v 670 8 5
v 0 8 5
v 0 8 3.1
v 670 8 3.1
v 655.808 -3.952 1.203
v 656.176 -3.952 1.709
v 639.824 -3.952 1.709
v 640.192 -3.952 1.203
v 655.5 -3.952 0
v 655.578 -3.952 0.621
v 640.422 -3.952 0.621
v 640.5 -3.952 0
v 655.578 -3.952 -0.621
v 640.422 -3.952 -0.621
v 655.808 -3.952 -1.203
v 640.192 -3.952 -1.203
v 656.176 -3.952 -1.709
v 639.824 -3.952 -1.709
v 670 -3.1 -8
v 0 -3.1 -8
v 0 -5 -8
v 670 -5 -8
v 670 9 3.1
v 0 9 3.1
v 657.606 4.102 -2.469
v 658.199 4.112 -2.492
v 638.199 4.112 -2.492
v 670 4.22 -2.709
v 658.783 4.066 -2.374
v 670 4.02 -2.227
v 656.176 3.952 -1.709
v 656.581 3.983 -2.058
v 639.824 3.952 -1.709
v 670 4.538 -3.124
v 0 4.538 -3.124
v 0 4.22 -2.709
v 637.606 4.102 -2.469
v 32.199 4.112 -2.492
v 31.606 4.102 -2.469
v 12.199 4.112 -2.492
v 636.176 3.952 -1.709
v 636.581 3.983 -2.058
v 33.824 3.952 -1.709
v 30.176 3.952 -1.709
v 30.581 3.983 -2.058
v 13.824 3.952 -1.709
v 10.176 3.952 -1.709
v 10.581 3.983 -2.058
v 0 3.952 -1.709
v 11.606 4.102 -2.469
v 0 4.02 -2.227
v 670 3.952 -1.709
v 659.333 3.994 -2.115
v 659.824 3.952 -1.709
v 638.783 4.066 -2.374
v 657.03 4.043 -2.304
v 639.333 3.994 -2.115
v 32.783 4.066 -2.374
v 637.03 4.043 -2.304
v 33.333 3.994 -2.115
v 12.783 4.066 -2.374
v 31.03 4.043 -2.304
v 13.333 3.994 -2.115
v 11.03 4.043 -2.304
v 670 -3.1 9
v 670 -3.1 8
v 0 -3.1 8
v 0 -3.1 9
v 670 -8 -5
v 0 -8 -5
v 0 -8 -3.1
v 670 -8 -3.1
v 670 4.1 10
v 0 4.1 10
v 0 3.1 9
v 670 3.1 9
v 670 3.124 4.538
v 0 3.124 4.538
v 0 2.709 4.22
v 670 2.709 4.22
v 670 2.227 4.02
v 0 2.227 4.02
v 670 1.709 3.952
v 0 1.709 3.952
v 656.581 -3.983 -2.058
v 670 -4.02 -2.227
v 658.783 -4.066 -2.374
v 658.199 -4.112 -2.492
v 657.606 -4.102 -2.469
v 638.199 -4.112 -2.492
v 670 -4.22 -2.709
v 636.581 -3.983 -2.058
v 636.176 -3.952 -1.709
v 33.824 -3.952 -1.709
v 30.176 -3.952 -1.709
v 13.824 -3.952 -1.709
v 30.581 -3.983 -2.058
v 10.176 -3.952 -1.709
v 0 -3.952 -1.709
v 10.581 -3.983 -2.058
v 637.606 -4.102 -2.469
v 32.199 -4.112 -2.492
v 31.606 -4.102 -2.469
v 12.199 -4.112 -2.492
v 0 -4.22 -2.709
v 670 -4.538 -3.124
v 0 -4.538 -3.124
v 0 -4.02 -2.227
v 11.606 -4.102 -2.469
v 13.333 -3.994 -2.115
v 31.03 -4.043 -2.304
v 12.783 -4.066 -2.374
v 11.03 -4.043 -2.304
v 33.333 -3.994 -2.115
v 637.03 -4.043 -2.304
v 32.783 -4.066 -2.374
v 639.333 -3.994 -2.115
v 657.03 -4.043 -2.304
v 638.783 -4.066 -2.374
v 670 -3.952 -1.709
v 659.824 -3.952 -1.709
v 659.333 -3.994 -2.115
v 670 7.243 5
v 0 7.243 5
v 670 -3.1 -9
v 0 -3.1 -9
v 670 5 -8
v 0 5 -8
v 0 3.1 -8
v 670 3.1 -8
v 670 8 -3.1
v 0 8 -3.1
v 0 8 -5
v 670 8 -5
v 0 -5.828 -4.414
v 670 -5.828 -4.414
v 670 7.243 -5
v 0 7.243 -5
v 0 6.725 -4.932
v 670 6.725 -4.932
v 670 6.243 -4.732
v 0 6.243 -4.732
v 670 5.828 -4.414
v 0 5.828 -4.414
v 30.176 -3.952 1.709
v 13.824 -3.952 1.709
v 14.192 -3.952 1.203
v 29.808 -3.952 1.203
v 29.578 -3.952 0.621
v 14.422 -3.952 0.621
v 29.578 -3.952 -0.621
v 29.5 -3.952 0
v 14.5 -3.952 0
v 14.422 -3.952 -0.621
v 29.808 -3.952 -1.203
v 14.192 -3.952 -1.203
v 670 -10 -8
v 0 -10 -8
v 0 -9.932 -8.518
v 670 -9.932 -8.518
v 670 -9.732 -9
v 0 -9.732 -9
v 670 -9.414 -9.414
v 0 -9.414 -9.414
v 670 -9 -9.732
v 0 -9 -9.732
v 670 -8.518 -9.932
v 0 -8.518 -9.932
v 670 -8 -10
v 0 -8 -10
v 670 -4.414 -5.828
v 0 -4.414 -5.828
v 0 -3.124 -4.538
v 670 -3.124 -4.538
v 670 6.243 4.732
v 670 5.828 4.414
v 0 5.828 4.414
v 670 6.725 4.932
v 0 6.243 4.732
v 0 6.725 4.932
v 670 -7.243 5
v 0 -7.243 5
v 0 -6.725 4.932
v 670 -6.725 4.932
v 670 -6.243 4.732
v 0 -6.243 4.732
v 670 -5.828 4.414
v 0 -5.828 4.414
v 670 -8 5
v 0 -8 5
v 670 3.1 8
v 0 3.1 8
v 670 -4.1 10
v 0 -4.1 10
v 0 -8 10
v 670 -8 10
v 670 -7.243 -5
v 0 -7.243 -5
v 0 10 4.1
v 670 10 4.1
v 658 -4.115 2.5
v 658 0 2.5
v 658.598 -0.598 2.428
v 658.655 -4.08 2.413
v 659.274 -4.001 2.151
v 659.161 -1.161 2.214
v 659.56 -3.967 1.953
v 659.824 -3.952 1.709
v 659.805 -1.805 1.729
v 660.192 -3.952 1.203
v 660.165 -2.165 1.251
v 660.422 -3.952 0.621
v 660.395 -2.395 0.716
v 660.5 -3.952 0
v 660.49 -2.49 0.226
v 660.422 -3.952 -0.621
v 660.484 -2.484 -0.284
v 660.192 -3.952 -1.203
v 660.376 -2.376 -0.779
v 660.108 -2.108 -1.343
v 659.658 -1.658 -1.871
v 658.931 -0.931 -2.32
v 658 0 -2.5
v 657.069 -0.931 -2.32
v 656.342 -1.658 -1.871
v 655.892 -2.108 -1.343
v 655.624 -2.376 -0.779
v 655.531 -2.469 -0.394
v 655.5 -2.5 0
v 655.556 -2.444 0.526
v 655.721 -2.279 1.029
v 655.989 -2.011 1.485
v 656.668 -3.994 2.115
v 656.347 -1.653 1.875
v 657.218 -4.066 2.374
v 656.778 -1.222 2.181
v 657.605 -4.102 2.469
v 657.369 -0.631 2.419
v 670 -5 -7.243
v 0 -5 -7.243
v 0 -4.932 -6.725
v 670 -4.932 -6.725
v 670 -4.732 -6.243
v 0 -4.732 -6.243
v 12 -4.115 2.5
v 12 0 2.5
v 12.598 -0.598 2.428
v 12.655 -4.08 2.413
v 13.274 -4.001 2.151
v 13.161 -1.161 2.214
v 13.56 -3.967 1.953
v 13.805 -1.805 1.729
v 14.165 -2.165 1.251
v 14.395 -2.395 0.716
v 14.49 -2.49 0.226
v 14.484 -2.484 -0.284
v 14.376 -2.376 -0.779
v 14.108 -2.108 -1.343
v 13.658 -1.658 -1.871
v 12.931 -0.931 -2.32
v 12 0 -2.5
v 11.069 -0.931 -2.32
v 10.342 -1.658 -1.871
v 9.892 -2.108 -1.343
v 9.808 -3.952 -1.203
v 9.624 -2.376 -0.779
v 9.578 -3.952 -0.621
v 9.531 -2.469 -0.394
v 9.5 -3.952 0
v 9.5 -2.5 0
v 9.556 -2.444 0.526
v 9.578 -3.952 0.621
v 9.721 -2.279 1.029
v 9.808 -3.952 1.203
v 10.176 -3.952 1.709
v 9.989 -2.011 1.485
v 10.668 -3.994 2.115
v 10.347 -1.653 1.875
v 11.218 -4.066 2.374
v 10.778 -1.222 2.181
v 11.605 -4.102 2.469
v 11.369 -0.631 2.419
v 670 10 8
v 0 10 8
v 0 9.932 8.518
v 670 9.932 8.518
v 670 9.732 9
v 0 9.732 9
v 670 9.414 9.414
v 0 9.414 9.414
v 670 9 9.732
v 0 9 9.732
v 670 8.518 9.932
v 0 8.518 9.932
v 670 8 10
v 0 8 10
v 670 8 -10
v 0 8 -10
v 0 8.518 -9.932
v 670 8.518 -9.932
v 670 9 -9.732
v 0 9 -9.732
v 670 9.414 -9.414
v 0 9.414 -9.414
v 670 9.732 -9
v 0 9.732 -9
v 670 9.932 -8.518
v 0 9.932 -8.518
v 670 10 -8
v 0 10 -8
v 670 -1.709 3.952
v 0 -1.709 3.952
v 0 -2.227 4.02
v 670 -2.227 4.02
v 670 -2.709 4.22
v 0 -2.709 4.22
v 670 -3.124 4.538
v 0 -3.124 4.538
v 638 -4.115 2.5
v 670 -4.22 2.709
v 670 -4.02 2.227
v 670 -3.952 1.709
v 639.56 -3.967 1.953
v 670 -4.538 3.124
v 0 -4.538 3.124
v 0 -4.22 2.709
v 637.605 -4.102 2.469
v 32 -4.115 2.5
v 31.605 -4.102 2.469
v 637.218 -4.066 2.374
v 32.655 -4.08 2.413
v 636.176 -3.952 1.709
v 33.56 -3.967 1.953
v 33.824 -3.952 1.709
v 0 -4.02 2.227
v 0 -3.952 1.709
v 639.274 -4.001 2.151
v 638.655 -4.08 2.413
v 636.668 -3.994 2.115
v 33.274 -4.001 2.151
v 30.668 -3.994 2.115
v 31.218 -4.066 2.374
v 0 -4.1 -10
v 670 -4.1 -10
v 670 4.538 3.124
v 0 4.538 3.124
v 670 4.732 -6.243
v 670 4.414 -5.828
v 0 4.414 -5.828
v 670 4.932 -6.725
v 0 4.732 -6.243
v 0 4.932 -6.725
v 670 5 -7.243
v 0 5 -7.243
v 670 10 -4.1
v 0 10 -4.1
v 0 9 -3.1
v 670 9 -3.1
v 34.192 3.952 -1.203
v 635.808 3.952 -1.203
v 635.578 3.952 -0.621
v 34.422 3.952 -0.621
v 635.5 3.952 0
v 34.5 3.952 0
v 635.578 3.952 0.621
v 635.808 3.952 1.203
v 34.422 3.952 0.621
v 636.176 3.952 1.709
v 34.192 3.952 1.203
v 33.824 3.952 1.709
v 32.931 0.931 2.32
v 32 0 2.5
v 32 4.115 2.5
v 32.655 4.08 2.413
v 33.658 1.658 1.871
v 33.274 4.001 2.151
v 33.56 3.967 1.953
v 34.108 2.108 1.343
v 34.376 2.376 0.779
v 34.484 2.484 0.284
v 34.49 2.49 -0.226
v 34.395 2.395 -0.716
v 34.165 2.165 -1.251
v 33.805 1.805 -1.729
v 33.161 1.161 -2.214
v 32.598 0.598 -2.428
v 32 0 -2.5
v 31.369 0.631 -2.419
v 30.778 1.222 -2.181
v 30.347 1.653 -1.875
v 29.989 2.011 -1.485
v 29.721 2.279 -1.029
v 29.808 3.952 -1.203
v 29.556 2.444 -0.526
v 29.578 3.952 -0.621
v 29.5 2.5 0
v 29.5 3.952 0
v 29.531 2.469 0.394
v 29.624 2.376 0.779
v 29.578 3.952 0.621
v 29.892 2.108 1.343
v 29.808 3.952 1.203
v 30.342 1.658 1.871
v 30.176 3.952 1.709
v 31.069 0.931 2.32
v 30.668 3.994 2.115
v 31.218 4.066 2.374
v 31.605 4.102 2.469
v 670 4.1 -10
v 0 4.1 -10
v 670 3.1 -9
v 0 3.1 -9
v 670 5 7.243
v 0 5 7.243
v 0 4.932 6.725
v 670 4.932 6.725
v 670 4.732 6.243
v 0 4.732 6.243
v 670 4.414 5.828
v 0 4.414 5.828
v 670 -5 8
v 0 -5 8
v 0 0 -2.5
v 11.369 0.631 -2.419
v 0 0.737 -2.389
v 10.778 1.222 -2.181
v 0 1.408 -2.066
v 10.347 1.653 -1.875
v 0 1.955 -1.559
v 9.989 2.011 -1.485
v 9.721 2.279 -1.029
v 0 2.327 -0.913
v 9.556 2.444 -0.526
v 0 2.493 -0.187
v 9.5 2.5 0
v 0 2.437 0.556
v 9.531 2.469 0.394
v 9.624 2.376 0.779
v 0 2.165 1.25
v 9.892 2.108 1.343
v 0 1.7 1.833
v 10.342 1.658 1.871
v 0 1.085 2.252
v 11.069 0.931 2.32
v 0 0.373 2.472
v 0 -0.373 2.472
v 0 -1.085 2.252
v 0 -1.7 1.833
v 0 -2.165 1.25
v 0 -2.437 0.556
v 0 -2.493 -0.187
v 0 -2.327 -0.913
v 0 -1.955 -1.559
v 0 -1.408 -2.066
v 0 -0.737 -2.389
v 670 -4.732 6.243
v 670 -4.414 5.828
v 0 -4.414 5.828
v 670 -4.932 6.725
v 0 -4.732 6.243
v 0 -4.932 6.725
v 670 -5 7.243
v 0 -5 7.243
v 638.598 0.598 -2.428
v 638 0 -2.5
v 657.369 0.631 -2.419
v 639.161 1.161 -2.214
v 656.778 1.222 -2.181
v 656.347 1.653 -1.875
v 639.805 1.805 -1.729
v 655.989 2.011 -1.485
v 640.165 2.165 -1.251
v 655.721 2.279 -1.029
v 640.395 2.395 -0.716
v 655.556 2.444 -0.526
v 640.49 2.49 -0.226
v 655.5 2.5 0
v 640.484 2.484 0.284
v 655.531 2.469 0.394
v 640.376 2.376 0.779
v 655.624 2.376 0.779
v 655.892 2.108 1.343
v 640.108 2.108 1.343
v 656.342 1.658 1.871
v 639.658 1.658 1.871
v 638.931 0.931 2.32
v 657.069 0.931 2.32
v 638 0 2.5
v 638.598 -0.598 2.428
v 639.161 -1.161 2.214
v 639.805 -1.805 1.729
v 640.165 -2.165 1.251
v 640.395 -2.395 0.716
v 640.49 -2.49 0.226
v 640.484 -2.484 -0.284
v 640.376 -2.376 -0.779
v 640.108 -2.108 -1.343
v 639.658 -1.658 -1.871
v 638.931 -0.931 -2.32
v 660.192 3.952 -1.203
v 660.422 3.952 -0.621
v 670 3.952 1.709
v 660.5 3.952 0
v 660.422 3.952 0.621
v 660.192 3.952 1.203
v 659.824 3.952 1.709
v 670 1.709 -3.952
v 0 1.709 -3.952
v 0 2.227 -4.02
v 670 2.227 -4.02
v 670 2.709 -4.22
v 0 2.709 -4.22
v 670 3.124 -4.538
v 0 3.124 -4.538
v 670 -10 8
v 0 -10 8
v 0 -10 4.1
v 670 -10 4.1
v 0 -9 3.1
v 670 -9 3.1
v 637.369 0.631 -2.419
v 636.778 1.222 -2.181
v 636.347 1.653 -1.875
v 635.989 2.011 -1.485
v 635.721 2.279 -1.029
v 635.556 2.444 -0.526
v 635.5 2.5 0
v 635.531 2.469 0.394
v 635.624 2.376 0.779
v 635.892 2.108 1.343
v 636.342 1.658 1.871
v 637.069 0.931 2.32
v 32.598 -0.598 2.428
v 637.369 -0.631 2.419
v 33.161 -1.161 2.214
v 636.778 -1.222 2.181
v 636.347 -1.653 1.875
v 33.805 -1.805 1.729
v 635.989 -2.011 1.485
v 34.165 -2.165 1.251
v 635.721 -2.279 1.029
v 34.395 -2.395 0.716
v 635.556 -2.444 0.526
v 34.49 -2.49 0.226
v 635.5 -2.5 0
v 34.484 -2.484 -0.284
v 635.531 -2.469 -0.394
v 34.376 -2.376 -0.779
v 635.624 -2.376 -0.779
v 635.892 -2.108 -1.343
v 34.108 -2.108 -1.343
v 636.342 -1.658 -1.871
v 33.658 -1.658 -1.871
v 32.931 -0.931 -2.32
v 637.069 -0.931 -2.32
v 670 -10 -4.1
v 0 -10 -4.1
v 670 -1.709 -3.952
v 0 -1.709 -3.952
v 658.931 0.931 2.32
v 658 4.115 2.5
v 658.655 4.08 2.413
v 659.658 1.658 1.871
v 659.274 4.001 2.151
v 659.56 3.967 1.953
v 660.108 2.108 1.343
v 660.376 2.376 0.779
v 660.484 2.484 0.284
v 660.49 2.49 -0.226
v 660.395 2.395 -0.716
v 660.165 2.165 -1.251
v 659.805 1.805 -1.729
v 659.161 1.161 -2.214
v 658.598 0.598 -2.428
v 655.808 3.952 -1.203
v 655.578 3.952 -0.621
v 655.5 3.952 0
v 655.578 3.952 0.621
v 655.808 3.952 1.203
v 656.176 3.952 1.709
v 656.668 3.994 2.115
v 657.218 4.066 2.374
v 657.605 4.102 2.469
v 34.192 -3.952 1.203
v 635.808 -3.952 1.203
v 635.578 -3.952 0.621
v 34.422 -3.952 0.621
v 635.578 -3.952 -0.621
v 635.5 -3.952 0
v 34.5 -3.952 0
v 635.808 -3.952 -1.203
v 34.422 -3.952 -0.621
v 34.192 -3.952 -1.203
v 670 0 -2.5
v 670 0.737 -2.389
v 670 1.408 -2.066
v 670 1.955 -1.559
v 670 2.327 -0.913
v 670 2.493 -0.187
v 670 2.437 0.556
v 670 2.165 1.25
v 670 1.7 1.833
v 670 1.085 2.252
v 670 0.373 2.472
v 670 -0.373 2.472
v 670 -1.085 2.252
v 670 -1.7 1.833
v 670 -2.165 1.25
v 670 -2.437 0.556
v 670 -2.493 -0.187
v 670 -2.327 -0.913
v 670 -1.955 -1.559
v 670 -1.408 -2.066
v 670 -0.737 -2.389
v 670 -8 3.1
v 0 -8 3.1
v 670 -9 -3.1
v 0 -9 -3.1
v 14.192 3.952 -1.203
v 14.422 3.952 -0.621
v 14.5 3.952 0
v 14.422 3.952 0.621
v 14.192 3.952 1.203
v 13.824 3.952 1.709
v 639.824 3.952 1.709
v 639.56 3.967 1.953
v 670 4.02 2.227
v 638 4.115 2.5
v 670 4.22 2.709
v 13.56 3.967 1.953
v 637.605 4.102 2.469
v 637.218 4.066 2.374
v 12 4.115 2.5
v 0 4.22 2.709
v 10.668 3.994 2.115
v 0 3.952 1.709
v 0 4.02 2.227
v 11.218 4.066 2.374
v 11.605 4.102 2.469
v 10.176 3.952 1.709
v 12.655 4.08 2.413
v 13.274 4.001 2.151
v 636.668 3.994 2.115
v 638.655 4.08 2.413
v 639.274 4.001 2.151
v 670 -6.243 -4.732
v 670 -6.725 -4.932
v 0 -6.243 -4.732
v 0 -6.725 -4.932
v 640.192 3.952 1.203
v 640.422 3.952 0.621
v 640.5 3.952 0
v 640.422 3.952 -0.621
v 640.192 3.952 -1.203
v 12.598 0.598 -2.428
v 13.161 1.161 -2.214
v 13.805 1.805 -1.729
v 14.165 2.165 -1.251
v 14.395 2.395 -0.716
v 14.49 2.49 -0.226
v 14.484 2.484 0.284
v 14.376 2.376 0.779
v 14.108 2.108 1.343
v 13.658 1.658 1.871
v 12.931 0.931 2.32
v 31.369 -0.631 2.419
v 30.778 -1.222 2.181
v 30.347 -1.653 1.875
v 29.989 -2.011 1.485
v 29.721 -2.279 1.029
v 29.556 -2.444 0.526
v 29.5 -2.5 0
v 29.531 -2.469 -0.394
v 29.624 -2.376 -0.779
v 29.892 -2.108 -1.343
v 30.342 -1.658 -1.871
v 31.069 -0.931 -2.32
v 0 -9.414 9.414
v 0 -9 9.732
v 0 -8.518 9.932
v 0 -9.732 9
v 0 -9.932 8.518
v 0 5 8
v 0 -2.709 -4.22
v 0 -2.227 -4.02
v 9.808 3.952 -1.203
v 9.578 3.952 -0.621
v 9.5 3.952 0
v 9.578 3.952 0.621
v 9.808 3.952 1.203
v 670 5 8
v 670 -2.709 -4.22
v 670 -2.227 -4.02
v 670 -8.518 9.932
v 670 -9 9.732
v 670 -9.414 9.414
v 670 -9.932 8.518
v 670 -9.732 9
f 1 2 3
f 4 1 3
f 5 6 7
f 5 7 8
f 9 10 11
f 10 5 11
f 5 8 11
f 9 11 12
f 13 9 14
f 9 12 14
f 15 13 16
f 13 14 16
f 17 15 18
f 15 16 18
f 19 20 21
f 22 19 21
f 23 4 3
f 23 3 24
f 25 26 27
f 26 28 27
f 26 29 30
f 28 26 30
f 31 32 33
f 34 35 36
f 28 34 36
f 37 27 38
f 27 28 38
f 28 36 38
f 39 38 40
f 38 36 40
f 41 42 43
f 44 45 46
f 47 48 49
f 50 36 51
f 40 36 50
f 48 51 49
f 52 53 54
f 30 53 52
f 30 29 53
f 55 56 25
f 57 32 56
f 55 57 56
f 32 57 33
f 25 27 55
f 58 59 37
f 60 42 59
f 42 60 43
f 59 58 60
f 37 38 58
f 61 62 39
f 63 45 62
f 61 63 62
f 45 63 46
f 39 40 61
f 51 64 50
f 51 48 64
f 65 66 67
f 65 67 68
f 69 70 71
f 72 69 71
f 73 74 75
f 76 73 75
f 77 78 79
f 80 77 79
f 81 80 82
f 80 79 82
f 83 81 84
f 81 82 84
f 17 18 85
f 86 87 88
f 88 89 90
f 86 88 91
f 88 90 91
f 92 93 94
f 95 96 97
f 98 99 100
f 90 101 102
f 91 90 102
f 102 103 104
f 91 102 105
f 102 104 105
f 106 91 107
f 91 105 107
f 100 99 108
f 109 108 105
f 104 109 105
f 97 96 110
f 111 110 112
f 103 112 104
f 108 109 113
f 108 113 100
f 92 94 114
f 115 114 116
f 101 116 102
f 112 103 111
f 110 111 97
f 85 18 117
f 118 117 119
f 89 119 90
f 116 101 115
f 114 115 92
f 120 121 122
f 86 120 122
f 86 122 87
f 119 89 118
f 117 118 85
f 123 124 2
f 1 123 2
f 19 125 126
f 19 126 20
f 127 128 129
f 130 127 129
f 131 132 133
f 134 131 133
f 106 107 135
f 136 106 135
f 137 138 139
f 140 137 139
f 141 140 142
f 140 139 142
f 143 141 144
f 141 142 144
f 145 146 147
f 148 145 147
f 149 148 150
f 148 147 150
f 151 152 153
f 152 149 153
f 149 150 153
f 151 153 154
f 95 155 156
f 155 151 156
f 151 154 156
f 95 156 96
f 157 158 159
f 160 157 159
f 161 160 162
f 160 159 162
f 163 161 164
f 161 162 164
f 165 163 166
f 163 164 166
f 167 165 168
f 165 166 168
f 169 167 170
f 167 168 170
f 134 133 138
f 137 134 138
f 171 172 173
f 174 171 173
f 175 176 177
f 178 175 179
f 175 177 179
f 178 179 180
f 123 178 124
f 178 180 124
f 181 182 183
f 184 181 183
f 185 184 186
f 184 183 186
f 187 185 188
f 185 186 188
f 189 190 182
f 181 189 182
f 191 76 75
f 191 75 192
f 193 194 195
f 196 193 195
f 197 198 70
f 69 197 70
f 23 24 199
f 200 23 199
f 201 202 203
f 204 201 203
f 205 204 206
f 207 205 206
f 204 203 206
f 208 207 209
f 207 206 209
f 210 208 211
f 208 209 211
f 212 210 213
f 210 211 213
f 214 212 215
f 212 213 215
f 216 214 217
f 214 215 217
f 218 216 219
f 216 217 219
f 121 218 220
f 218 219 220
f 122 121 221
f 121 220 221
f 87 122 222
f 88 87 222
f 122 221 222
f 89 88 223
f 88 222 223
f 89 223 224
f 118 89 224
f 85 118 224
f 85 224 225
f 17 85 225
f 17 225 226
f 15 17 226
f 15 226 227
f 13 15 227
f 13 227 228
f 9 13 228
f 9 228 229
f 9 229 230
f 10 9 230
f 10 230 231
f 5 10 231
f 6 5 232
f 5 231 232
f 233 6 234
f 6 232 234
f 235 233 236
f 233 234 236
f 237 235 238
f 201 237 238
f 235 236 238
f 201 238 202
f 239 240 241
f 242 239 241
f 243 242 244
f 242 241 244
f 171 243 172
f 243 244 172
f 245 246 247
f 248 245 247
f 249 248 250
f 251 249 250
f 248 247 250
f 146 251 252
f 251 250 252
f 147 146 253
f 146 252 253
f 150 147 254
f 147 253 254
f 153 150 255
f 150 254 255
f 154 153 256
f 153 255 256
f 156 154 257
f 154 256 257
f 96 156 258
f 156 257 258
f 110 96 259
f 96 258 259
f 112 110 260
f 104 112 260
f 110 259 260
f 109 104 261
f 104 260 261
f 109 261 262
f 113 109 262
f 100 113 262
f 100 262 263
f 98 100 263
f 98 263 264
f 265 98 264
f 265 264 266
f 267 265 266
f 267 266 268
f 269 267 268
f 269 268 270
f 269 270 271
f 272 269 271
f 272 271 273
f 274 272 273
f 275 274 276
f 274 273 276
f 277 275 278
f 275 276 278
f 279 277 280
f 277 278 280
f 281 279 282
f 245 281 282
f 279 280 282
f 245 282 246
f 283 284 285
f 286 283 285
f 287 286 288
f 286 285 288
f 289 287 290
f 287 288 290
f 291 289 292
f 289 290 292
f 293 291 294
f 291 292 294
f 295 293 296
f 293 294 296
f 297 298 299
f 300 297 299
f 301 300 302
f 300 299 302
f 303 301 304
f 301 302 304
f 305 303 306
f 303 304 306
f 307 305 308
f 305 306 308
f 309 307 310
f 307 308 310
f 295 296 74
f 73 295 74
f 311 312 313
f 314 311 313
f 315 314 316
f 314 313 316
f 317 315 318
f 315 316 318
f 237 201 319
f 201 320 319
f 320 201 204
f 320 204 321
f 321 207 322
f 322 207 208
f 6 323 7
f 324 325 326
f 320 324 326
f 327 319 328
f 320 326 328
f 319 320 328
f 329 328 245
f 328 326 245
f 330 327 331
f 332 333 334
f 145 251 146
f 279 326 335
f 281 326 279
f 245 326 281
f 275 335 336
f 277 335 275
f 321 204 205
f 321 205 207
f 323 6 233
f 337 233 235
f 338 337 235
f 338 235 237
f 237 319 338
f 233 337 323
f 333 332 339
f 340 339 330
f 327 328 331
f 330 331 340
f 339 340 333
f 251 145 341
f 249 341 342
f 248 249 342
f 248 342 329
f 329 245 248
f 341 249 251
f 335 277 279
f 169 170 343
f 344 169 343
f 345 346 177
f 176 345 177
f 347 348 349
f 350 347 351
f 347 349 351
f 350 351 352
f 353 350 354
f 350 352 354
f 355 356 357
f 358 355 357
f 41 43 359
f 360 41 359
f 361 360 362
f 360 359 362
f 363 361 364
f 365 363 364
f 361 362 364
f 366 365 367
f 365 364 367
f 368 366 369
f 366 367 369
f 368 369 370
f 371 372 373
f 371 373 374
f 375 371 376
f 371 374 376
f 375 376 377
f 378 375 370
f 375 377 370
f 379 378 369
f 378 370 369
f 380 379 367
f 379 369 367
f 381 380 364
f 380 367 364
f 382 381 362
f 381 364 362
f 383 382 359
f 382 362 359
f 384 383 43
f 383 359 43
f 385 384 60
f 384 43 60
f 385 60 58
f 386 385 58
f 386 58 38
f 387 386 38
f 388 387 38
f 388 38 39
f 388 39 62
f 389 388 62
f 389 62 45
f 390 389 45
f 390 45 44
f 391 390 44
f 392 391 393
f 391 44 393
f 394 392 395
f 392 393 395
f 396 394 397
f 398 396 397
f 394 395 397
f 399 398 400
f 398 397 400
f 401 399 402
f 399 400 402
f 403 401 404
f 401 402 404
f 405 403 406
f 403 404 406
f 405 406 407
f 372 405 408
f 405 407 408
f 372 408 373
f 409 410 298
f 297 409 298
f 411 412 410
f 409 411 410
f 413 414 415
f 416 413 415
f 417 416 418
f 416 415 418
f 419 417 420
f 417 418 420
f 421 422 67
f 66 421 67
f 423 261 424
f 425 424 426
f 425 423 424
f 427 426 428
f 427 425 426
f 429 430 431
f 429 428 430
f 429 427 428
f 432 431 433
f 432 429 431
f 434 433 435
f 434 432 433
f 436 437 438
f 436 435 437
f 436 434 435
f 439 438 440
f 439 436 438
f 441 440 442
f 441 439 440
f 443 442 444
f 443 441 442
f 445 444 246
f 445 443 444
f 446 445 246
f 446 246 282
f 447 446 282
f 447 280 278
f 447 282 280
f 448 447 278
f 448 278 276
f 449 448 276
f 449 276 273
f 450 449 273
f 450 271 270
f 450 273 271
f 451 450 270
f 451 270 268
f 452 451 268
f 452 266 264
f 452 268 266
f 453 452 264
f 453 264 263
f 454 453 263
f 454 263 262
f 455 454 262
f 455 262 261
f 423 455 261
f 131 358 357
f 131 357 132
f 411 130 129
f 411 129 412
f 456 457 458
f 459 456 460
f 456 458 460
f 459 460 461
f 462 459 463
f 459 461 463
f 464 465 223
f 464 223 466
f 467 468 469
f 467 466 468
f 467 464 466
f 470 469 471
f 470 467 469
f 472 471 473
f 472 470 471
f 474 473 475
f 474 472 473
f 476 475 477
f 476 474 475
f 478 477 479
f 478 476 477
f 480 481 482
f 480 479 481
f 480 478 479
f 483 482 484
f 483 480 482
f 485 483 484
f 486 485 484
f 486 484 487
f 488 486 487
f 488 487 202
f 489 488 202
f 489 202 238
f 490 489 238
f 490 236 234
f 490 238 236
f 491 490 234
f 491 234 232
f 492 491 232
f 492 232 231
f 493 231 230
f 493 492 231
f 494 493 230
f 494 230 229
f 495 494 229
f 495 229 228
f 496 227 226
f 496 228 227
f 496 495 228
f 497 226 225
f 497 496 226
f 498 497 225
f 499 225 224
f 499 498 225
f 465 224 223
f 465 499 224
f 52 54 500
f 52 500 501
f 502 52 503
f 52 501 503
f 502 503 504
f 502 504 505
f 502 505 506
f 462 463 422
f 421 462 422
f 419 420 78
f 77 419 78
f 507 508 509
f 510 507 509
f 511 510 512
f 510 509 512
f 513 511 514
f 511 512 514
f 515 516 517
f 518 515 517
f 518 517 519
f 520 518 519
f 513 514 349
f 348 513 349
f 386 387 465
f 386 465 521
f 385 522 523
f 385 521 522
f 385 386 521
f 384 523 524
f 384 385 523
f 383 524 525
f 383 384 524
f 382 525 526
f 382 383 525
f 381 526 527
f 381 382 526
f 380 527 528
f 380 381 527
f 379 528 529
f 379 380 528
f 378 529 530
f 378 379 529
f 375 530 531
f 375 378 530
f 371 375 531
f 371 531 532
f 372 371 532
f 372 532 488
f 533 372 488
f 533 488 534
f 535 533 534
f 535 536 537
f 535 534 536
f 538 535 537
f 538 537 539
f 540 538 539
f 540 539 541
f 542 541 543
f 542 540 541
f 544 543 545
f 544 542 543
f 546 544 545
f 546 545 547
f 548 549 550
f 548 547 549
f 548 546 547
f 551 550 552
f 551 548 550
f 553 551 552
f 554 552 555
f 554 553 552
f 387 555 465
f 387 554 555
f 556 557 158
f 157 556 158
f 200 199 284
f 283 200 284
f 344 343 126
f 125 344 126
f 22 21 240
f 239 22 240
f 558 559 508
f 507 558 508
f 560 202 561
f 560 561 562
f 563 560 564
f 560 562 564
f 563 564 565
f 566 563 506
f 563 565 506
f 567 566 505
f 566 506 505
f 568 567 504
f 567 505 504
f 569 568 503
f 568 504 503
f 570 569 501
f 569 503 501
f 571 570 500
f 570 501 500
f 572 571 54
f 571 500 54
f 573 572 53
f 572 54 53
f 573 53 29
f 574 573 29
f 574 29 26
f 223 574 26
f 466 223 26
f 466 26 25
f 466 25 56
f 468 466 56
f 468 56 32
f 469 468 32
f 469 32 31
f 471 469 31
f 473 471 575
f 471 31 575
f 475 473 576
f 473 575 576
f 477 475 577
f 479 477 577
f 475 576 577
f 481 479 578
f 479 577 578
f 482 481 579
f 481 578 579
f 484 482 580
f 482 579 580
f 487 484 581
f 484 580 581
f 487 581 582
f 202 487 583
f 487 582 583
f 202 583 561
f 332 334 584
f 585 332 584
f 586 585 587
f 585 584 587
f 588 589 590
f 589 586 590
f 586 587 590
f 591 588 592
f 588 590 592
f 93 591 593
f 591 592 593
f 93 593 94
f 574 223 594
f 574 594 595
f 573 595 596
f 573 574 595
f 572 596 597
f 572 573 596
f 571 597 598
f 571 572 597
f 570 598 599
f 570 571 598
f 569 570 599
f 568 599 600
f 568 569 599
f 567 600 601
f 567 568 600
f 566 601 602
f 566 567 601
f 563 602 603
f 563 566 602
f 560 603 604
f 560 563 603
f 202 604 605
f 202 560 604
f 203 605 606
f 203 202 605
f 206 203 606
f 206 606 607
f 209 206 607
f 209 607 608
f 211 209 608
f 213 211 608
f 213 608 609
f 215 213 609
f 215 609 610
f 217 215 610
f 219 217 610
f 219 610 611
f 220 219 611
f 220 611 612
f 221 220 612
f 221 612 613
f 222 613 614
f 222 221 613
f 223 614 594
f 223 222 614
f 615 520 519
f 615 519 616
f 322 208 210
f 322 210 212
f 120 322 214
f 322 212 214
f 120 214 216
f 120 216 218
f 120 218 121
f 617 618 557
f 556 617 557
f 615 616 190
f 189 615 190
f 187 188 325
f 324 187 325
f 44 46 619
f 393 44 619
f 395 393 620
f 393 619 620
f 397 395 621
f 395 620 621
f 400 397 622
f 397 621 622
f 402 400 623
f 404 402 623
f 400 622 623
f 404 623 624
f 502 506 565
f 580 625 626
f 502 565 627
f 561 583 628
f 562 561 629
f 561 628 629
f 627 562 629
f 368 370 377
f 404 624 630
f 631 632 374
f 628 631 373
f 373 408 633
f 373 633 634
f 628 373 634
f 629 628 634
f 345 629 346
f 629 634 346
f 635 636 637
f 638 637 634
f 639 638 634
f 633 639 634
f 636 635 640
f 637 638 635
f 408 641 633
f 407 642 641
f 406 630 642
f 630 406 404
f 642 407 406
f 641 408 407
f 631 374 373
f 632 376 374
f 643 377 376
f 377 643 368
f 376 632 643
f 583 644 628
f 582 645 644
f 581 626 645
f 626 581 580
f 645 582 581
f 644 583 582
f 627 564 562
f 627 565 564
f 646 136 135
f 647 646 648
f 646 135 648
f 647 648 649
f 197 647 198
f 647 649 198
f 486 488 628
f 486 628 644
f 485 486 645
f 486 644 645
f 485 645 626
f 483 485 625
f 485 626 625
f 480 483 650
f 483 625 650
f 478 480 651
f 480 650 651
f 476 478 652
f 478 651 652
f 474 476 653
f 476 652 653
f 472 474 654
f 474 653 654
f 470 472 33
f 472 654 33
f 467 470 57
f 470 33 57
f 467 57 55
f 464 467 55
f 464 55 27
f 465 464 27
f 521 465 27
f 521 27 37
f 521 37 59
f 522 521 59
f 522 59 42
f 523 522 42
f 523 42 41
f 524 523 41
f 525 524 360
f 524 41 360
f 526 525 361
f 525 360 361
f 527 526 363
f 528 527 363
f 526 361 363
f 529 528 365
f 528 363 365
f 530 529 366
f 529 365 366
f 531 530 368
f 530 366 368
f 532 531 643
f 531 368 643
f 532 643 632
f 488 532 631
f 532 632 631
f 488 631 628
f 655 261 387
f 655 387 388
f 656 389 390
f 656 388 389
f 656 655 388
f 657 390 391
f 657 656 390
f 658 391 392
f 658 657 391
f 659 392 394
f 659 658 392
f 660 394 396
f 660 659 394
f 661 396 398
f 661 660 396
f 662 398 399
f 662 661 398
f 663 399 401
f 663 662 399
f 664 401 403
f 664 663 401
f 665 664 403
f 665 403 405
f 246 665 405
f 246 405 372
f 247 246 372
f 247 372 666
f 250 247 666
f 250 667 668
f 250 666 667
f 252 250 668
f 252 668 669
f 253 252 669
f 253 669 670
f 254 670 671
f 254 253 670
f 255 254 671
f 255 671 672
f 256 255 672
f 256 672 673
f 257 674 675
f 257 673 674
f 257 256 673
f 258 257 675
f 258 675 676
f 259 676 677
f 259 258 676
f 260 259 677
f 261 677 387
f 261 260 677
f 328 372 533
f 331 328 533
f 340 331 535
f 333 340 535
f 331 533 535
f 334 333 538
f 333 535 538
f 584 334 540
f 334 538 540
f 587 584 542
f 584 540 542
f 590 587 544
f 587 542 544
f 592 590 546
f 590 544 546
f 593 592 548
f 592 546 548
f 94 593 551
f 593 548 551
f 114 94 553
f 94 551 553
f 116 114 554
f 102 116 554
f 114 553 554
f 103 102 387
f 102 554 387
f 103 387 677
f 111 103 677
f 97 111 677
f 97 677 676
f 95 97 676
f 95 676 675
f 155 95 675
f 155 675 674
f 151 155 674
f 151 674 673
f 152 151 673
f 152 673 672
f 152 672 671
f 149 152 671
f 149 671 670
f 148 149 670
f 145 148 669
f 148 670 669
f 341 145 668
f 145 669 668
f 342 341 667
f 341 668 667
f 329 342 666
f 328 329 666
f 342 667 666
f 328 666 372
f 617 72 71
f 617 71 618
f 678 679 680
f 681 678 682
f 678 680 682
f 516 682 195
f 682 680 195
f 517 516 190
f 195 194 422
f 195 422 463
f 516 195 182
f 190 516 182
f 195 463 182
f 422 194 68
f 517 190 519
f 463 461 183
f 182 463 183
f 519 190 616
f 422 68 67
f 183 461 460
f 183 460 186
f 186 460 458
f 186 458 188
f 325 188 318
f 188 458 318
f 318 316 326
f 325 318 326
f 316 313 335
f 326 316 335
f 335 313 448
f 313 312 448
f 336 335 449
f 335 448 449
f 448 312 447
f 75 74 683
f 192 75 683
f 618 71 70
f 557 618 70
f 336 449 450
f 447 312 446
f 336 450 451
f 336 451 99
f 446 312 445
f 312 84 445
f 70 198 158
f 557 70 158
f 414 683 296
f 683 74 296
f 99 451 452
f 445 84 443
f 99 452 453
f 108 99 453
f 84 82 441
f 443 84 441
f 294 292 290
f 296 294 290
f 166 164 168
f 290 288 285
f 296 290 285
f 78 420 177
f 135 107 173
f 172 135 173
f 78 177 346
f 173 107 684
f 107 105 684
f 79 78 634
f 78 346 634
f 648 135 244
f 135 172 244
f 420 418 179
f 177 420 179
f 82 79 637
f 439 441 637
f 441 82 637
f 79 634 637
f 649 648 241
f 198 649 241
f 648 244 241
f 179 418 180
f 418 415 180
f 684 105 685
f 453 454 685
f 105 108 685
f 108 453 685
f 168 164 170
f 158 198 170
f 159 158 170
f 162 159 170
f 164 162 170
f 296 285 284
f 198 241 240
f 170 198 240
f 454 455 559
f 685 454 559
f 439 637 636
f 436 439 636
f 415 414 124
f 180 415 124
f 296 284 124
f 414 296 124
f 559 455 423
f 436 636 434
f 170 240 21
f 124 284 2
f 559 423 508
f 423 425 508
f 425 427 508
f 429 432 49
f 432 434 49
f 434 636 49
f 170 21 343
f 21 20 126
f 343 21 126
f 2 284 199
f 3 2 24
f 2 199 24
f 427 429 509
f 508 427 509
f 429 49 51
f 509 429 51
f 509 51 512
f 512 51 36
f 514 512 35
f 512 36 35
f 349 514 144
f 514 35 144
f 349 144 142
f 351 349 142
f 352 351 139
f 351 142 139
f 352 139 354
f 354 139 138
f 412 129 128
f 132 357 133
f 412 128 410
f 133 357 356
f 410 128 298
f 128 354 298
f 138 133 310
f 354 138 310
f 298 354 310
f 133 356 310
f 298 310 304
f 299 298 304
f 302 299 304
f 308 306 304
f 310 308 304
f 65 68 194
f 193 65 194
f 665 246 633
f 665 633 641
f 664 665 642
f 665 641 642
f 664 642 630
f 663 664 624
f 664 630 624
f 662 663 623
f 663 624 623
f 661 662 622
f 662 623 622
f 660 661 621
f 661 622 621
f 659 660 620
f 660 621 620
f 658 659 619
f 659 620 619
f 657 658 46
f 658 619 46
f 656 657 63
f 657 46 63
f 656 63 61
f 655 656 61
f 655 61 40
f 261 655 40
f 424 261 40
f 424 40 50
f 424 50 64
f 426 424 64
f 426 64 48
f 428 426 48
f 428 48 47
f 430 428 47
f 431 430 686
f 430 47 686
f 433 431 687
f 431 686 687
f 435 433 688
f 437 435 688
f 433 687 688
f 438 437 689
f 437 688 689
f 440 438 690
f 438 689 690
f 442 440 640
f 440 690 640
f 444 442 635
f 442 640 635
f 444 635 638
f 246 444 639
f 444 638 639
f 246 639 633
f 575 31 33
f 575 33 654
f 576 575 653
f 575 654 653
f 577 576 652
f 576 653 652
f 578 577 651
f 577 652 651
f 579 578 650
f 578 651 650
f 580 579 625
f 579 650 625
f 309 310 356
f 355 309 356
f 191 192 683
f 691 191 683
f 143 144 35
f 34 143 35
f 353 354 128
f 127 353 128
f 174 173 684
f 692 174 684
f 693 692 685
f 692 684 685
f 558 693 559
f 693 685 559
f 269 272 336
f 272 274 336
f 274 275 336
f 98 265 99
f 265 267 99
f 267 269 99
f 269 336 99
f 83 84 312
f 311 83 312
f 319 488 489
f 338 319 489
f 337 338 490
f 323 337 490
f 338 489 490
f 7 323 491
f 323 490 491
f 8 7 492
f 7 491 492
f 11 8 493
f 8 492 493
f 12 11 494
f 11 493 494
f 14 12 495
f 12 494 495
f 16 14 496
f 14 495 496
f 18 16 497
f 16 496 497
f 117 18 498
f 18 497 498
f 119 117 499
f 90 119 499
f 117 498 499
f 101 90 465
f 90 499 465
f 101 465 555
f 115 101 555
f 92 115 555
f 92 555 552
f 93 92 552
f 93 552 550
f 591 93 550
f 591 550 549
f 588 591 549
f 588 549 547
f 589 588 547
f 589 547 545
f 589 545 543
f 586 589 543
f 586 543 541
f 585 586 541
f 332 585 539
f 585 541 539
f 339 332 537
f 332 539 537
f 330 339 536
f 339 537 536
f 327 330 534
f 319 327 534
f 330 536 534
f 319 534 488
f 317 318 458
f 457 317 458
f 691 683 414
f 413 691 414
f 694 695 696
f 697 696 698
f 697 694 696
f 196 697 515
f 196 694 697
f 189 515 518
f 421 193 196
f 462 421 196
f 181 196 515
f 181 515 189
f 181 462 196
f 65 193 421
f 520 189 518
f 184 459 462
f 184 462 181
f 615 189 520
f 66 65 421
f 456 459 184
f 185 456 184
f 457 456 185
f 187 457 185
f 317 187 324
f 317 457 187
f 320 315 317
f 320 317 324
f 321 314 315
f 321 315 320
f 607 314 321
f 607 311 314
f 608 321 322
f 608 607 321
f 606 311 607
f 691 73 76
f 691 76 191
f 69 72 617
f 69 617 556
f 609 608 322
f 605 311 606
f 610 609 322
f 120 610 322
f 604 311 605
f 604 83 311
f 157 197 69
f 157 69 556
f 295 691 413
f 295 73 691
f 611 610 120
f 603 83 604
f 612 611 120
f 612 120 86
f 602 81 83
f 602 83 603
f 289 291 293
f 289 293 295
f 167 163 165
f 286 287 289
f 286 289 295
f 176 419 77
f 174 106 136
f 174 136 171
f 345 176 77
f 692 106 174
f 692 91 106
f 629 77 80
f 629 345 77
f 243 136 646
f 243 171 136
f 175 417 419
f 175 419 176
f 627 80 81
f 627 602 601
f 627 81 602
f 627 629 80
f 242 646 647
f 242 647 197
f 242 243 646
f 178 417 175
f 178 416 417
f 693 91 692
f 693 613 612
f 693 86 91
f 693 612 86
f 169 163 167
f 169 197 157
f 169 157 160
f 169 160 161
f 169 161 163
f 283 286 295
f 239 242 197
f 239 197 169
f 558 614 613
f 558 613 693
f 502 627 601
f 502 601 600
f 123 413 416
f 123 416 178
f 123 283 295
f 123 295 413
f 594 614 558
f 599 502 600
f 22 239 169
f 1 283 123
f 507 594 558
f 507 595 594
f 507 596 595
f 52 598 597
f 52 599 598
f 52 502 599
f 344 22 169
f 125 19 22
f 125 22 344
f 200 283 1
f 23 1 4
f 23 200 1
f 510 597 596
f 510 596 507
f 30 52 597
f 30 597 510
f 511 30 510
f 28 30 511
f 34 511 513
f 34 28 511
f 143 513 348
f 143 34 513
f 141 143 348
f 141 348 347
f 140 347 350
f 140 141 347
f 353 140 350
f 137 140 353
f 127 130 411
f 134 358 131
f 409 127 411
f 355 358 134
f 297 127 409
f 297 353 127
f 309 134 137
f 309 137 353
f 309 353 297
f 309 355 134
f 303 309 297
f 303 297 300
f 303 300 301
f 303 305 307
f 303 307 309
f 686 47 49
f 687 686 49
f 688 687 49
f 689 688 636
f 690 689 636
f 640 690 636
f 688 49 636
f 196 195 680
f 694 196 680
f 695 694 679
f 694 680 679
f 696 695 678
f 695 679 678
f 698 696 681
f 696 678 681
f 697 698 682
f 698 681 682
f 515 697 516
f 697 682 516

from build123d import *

# Parameters (mm, degrees)
SKETCH1_R           = 2.5
BOSS_EXTRUDE1_DEPTH = 670
SKETCH2_R           = 2.5
CUT_EXTRUDE1_DEPTH  = 671.373030484


with BuildPart() as part:
    # Sketch1 → Boss-Extrude1 (new body)
    with BuildSketch(Plane(origin=(0, 0, 0), x_dir=(0, 0, -1), z_dir=(1, 0, 0))):
        with BuildLine():
            Line((-4.1, 10), (-8, 10))
            ThreePointArc((-8, 10), (-9.414213562, 9.414213562), (-10, 8))
            Line((-10, 8), (-10, 4.1))
            Line((-10, 4.1), (-9, 3.1))
            Line((-9, 3.1), (-8, 3.1))
            Line((-8, 3.1), (-8, 5))
            Line((-8, 5), (-7.242640687, 5))
            ThreePointArc((-7.242640687, 5), (-6.477273822, 4.847759065), (-5.828427125, 4.414213562))
            Line((-5.828427125, 4.414213562), (-4.537854624, 3.123641061))
            ThreePointArc((-4.537854624, 3.123641061), (-4.104309121, 2.474794364), (-3.952068186, 1.709427499))
            Line((-3.952068186, 1.709427499), (-3.952068186, -1.709427499))
            ThreePointArc((-3.952068186, -1.709427499), (-4.104309121, -2.474794364), (-4.537854624, -3.123641061))
            Line((-4.537854624, -3.123641061), (-5.828427125, -4.414213562))
            ThreePointArc((-5.828427125, -4.414213562), (-6.477273822, -4.847759065), (-7.242640687, -5))
            Line((-7.242640687, -5), (-8, -5))
            Line((-8, -5), (-8, -3.1))
            Line((-8, -3.1), (-9, -3.1))
            Line((-9, -3.1), (-10, -4.1))
            Line((-10, -4.1), (-10, -8))
            ThreePointArc((-10, -8), (-9.414213562, -9.414213562), (-8, -10))
            Line((-8, -10), (-4.1, -10))
            Line((-4.1, -10), (-3.1, -9))
            Line((-3.1, -9), (-3.1, -8))
            Line((-3.1, -8), (-5, -8))
            Line((-5, -8), (-5, -7.242640687))
            ThreePointArc((-5, -7.242640687), (-4.847759065, -6.477273822), (-4.414213562, -5.828427125))
            Line((-4.414213562, -5.828427125), (-3.123641061, -4.537854624))
            ThreePointArc((-3.123641061, -4.537854624), (-2.474794364, -4.104309121), (-1.709427499, -3.952068186))
            Line((-1.709427499, -3.952068186), (1.709427499, -3.952068186))
            ThreePointArc((1.709427499, -3.952068186), (2.474794364, -4.104309121), (3.123641061, -4.537854624))
            Line((3.123641061, -4.537854624), (4.414213562, -5.828427125))
            ThreePointArc((4.414213562, -5.828427125), (4.847759065, -6.477273822), (5, -7.242640687))
            Line((5, -7.242640687), (5, -8))
            Line((5, -8), (3.1, -8))
            Line((3.1, -8), (3.1, -9))
            Line((3.1, -9), (4.1, -10))
            Line((4.1, -10), (8, -10))
            ThreePointArc((8, -10), (9.414213562, -9.414213562), (10, -8))
            Line((10, -8), (10, -4.1))
            Line((10, -4.1), (9, -3.1))
            Line((9, -3.1), (8, -3.1))
            Line((8, -3.1), (8, -5))
            Line((8, -5), (7.242640687, -5))
            ThreePointArc((7.242640687, -5), (6.477273822, -4.847759065), (5.828427125, -4.414213562))
            Line((5.828427125, -4.414213562), (4.537854624, -3.123641061))
            ThreePointArc((4.537854624, -3.123641061), (4.104309121, -2.474794364), (3.952068186, -1.709427499))
            Line((3.952068186, -1.709427499), (3.952068186, 1.709427499))
            ThreePointArc((3.952068186, 1.709427499), (4.104309121, 2.474794364), (4.537854624, 3.123641061))
            Line((4.537854624, 3.123641061), (5.828427125, 4.414213562))
            ThreePointArc((5.828427125, 4.414213562), (6.477273822, 4.847759065), (7.242640687, 5))
            Line((7.242640687, 5), (8, 5))
            Line((8, 5), (8, 3.1))
            Line((8, 3.1), (9, 3.1))
            Line((9, 3.1), (10, 4.1))
            Line((10, 4.1), (10, 8))
            ThreePointArc((10, 8), (9.414213562, 9.414213562), (8, 10))
            Line((8, 10), (4.1, 10))
            Line((4.1, 10), (3.1, 9))
            Line((3.1, 9), (3.1, 8))
            Line((3.1, 8), (5, 8))
            Line((5, 8), (5, 7.242640687))
            ThreePointArc((5, 7.242640687), (4.847759065, 6.477273822), (4.414213562, 5.828427125))
            Line((4.414213562, 5.828427125), (3.123641061, 4.537854624))
            ThreePointArc((3.123641061, 4.537854624), (2.474794364, 4.104309121), (1.709427499, 3.952068186))
            Line((1.709427499, 3.952068186), (-1.709427499, 3.952068186))
            ThreePointArc((-1.709427499, 3.952068186), (-2.474794364, 4.104309121), (-3.123641061, 4.537854624))
            Line((-3.123641061, 4.537854624), (-4.414213562, 5.828427125))
            ThreePointArc((-4.414213562, 5.828427125), (-4.847759065, 6.477273822), (-5, 7.242640687))
            Line((-5, 7.242640687), (-5, 8))
            Line((-5, 8), (-3.1, 8))
            Line((-3.1, 8), (-3.1, 9))
            Line((-3.1, 9), (-4.1, 10))
        make_face()
        Circle(SKETCH1_R, mode=Mode.SUBTRACT)
    extrude(amount=BOSS_EXTRUDE1_DEPTH)

    # Sketch2 → Cut-Extrude1 (cut, through all)
    with BuildSketch(Plane(origin=(0, 10, 0), x_dir=(1, 0, 0), z_dir=(0, 1, 0))):
        with Locations(Location((658, 0, 0), (0, 0, 270))):
            Circle(SKETCH2_R)
        with Locations(Location((638, 0, 0), (0, 0, 270))):
            Circle(SKETCH2_R)
        with Locations(Location((32, 0, 0), (0, 0, 270))):
            Circle(SKETCH2_R)
        with Locations(Location((12, 0, 0), (0, 0, 270))):
            Circle(SKETCH2_R)
    extrude(amount=-CUT_EXTRUDE1_DEPTH, mode=Mode.SUBTRACT)


solid = part.part
